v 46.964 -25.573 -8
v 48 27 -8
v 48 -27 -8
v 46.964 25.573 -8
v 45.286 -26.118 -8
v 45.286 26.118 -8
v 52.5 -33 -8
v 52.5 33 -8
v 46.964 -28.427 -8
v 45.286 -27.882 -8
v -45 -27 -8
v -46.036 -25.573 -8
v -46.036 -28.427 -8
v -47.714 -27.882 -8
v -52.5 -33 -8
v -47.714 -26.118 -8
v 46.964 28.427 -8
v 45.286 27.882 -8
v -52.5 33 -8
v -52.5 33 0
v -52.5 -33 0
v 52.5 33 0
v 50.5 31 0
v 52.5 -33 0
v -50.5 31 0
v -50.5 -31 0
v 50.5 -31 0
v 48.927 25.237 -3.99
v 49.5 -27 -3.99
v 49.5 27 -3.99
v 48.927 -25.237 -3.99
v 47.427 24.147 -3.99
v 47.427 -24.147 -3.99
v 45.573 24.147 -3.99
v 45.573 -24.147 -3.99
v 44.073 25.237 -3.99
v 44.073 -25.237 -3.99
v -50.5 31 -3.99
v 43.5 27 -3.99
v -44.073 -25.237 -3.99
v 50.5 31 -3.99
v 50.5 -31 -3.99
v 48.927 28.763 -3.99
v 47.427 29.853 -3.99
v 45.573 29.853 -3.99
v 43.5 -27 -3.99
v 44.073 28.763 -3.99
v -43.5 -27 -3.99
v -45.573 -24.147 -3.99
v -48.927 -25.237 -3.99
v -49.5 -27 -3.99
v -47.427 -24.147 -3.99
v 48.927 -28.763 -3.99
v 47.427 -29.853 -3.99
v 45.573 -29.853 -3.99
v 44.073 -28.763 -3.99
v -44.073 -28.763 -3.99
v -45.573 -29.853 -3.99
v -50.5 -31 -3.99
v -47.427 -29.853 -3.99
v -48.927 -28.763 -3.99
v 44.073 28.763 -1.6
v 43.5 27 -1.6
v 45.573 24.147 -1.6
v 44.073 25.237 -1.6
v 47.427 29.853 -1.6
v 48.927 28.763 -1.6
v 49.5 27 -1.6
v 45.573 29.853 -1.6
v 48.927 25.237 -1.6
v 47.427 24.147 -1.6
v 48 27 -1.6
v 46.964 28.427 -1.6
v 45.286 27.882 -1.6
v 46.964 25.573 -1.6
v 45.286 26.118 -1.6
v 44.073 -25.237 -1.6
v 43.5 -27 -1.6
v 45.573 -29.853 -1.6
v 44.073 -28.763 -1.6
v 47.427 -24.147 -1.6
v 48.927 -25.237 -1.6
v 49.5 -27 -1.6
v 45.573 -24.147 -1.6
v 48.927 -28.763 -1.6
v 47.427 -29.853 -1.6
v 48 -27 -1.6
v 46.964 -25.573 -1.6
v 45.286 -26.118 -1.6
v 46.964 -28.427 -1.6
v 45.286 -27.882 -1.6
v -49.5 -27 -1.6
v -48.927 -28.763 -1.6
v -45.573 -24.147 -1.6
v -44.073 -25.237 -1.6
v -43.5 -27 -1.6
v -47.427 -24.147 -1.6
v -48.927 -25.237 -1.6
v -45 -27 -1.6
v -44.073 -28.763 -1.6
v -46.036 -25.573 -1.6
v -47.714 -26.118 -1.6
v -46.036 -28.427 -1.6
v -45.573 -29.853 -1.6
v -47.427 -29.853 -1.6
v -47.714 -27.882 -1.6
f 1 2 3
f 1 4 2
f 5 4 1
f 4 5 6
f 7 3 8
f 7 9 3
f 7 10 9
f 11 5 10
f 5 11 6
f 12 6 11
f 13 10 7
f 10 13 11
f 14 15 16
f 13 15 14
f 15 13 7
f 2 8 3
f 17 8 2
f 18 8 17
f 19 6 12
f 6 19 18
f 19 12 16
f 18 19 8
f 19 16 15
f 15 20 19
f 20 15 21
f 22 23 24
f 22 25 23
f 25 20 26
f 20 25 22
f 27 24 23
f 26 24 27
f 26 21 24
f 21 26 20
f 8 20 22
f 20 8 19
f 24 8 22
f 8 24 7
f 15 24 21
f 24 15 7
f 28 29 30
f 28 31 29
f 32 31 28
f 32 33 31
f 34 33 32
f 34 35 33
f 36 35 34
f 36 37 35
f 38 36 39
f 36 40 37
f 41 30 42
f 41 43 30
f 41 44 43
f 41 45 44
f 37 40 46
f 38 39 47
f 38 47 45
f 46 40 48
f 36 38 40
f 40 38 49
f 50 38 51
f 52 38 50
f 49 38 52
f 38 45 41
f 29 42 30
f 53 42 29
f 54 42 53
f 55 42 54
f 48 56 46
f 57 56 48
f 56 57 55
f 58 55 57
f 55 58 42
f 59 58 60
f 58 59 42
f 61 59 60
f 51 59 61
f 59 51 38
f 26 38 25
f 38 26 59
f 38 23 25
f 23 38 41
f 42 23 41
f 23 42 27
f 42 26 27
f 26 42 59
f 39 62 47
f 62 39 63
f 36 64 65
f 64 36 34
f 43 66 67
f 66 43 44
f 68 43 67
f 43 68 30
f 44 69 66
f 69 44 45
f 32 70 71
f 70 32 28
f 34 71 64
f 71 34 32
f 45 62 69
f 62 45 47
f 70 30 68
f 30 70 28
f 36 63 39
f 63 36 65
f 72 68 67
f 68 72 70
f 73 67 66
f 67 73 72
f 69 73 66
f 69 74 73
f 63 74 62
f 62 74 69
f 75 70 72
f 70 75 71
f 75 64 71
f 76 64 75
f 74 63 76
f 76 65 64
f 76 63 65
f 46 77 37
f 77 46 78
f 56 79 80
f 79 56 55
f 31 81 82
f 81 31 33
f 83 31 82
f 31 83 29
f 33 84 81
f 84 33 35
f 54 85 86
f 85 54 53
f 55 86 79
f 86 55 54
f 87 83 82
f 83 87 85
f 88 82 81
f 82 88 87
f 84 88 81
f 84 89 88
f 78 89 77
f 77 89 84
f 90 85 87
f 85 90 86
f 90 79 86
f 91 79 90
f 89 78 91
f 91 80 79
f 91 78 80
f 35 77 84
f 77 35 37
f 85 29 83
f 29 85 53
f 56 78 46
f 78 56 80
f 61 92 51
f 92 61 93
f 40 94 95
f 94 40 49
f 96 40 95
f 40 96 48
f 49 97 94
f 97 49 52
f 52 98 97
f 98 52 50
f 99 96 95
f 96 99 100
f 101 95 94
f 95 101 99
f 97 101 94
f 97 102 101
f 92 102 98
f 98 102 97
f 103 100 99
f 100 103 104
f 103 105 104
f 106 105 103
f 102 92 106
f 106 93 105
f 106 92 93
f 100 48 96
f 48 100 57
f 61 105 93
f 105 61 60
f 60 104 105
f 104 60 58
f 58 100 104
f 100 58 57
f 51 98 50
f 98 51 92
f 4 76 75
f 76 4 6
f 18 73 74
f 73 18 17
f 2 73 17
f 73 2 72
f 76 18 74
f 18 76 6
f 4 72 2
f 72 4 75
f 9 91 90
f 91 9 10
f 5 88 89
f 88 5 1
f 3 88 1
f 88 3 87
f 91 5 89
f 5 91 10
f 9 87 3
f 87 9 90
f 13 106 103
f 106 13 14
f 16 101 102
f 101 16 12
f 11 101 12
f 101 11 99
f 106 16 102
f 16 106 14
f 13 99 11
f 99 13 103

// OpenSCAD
height = 8;
tray_depth = 4;
pcb_thickness = 1.6;

screw_positions = [
  [46.5, 27],
  [46.5, -27],
  [-46.5, -27],
];

difference() {
  union() {
    difference() {
      translate([0, 0, -height]) {
        linear_extrude(height) {
          square([105, 66], center = true);
        }
      }

      translate([0, 0, 0.01 - tray_depth]) {
        linear_extrude(tray_depth) {
          square([101, 62], center = true);
        }
      }
    }

    translate([0, 0, -tray_depth]) {
      for(p = screw_positions) {
        translate(p) {
          cylinder(d = 6, h = abs(tray_depth) - pcb_thickness);
        }
      }
    }
  }

  translate([0, 0, -height - 1]) {
    for(p = screw_positions) {
      translate(p) {
        cylinder(d = 3, h = height + 2);
      }
    }
  }
}
